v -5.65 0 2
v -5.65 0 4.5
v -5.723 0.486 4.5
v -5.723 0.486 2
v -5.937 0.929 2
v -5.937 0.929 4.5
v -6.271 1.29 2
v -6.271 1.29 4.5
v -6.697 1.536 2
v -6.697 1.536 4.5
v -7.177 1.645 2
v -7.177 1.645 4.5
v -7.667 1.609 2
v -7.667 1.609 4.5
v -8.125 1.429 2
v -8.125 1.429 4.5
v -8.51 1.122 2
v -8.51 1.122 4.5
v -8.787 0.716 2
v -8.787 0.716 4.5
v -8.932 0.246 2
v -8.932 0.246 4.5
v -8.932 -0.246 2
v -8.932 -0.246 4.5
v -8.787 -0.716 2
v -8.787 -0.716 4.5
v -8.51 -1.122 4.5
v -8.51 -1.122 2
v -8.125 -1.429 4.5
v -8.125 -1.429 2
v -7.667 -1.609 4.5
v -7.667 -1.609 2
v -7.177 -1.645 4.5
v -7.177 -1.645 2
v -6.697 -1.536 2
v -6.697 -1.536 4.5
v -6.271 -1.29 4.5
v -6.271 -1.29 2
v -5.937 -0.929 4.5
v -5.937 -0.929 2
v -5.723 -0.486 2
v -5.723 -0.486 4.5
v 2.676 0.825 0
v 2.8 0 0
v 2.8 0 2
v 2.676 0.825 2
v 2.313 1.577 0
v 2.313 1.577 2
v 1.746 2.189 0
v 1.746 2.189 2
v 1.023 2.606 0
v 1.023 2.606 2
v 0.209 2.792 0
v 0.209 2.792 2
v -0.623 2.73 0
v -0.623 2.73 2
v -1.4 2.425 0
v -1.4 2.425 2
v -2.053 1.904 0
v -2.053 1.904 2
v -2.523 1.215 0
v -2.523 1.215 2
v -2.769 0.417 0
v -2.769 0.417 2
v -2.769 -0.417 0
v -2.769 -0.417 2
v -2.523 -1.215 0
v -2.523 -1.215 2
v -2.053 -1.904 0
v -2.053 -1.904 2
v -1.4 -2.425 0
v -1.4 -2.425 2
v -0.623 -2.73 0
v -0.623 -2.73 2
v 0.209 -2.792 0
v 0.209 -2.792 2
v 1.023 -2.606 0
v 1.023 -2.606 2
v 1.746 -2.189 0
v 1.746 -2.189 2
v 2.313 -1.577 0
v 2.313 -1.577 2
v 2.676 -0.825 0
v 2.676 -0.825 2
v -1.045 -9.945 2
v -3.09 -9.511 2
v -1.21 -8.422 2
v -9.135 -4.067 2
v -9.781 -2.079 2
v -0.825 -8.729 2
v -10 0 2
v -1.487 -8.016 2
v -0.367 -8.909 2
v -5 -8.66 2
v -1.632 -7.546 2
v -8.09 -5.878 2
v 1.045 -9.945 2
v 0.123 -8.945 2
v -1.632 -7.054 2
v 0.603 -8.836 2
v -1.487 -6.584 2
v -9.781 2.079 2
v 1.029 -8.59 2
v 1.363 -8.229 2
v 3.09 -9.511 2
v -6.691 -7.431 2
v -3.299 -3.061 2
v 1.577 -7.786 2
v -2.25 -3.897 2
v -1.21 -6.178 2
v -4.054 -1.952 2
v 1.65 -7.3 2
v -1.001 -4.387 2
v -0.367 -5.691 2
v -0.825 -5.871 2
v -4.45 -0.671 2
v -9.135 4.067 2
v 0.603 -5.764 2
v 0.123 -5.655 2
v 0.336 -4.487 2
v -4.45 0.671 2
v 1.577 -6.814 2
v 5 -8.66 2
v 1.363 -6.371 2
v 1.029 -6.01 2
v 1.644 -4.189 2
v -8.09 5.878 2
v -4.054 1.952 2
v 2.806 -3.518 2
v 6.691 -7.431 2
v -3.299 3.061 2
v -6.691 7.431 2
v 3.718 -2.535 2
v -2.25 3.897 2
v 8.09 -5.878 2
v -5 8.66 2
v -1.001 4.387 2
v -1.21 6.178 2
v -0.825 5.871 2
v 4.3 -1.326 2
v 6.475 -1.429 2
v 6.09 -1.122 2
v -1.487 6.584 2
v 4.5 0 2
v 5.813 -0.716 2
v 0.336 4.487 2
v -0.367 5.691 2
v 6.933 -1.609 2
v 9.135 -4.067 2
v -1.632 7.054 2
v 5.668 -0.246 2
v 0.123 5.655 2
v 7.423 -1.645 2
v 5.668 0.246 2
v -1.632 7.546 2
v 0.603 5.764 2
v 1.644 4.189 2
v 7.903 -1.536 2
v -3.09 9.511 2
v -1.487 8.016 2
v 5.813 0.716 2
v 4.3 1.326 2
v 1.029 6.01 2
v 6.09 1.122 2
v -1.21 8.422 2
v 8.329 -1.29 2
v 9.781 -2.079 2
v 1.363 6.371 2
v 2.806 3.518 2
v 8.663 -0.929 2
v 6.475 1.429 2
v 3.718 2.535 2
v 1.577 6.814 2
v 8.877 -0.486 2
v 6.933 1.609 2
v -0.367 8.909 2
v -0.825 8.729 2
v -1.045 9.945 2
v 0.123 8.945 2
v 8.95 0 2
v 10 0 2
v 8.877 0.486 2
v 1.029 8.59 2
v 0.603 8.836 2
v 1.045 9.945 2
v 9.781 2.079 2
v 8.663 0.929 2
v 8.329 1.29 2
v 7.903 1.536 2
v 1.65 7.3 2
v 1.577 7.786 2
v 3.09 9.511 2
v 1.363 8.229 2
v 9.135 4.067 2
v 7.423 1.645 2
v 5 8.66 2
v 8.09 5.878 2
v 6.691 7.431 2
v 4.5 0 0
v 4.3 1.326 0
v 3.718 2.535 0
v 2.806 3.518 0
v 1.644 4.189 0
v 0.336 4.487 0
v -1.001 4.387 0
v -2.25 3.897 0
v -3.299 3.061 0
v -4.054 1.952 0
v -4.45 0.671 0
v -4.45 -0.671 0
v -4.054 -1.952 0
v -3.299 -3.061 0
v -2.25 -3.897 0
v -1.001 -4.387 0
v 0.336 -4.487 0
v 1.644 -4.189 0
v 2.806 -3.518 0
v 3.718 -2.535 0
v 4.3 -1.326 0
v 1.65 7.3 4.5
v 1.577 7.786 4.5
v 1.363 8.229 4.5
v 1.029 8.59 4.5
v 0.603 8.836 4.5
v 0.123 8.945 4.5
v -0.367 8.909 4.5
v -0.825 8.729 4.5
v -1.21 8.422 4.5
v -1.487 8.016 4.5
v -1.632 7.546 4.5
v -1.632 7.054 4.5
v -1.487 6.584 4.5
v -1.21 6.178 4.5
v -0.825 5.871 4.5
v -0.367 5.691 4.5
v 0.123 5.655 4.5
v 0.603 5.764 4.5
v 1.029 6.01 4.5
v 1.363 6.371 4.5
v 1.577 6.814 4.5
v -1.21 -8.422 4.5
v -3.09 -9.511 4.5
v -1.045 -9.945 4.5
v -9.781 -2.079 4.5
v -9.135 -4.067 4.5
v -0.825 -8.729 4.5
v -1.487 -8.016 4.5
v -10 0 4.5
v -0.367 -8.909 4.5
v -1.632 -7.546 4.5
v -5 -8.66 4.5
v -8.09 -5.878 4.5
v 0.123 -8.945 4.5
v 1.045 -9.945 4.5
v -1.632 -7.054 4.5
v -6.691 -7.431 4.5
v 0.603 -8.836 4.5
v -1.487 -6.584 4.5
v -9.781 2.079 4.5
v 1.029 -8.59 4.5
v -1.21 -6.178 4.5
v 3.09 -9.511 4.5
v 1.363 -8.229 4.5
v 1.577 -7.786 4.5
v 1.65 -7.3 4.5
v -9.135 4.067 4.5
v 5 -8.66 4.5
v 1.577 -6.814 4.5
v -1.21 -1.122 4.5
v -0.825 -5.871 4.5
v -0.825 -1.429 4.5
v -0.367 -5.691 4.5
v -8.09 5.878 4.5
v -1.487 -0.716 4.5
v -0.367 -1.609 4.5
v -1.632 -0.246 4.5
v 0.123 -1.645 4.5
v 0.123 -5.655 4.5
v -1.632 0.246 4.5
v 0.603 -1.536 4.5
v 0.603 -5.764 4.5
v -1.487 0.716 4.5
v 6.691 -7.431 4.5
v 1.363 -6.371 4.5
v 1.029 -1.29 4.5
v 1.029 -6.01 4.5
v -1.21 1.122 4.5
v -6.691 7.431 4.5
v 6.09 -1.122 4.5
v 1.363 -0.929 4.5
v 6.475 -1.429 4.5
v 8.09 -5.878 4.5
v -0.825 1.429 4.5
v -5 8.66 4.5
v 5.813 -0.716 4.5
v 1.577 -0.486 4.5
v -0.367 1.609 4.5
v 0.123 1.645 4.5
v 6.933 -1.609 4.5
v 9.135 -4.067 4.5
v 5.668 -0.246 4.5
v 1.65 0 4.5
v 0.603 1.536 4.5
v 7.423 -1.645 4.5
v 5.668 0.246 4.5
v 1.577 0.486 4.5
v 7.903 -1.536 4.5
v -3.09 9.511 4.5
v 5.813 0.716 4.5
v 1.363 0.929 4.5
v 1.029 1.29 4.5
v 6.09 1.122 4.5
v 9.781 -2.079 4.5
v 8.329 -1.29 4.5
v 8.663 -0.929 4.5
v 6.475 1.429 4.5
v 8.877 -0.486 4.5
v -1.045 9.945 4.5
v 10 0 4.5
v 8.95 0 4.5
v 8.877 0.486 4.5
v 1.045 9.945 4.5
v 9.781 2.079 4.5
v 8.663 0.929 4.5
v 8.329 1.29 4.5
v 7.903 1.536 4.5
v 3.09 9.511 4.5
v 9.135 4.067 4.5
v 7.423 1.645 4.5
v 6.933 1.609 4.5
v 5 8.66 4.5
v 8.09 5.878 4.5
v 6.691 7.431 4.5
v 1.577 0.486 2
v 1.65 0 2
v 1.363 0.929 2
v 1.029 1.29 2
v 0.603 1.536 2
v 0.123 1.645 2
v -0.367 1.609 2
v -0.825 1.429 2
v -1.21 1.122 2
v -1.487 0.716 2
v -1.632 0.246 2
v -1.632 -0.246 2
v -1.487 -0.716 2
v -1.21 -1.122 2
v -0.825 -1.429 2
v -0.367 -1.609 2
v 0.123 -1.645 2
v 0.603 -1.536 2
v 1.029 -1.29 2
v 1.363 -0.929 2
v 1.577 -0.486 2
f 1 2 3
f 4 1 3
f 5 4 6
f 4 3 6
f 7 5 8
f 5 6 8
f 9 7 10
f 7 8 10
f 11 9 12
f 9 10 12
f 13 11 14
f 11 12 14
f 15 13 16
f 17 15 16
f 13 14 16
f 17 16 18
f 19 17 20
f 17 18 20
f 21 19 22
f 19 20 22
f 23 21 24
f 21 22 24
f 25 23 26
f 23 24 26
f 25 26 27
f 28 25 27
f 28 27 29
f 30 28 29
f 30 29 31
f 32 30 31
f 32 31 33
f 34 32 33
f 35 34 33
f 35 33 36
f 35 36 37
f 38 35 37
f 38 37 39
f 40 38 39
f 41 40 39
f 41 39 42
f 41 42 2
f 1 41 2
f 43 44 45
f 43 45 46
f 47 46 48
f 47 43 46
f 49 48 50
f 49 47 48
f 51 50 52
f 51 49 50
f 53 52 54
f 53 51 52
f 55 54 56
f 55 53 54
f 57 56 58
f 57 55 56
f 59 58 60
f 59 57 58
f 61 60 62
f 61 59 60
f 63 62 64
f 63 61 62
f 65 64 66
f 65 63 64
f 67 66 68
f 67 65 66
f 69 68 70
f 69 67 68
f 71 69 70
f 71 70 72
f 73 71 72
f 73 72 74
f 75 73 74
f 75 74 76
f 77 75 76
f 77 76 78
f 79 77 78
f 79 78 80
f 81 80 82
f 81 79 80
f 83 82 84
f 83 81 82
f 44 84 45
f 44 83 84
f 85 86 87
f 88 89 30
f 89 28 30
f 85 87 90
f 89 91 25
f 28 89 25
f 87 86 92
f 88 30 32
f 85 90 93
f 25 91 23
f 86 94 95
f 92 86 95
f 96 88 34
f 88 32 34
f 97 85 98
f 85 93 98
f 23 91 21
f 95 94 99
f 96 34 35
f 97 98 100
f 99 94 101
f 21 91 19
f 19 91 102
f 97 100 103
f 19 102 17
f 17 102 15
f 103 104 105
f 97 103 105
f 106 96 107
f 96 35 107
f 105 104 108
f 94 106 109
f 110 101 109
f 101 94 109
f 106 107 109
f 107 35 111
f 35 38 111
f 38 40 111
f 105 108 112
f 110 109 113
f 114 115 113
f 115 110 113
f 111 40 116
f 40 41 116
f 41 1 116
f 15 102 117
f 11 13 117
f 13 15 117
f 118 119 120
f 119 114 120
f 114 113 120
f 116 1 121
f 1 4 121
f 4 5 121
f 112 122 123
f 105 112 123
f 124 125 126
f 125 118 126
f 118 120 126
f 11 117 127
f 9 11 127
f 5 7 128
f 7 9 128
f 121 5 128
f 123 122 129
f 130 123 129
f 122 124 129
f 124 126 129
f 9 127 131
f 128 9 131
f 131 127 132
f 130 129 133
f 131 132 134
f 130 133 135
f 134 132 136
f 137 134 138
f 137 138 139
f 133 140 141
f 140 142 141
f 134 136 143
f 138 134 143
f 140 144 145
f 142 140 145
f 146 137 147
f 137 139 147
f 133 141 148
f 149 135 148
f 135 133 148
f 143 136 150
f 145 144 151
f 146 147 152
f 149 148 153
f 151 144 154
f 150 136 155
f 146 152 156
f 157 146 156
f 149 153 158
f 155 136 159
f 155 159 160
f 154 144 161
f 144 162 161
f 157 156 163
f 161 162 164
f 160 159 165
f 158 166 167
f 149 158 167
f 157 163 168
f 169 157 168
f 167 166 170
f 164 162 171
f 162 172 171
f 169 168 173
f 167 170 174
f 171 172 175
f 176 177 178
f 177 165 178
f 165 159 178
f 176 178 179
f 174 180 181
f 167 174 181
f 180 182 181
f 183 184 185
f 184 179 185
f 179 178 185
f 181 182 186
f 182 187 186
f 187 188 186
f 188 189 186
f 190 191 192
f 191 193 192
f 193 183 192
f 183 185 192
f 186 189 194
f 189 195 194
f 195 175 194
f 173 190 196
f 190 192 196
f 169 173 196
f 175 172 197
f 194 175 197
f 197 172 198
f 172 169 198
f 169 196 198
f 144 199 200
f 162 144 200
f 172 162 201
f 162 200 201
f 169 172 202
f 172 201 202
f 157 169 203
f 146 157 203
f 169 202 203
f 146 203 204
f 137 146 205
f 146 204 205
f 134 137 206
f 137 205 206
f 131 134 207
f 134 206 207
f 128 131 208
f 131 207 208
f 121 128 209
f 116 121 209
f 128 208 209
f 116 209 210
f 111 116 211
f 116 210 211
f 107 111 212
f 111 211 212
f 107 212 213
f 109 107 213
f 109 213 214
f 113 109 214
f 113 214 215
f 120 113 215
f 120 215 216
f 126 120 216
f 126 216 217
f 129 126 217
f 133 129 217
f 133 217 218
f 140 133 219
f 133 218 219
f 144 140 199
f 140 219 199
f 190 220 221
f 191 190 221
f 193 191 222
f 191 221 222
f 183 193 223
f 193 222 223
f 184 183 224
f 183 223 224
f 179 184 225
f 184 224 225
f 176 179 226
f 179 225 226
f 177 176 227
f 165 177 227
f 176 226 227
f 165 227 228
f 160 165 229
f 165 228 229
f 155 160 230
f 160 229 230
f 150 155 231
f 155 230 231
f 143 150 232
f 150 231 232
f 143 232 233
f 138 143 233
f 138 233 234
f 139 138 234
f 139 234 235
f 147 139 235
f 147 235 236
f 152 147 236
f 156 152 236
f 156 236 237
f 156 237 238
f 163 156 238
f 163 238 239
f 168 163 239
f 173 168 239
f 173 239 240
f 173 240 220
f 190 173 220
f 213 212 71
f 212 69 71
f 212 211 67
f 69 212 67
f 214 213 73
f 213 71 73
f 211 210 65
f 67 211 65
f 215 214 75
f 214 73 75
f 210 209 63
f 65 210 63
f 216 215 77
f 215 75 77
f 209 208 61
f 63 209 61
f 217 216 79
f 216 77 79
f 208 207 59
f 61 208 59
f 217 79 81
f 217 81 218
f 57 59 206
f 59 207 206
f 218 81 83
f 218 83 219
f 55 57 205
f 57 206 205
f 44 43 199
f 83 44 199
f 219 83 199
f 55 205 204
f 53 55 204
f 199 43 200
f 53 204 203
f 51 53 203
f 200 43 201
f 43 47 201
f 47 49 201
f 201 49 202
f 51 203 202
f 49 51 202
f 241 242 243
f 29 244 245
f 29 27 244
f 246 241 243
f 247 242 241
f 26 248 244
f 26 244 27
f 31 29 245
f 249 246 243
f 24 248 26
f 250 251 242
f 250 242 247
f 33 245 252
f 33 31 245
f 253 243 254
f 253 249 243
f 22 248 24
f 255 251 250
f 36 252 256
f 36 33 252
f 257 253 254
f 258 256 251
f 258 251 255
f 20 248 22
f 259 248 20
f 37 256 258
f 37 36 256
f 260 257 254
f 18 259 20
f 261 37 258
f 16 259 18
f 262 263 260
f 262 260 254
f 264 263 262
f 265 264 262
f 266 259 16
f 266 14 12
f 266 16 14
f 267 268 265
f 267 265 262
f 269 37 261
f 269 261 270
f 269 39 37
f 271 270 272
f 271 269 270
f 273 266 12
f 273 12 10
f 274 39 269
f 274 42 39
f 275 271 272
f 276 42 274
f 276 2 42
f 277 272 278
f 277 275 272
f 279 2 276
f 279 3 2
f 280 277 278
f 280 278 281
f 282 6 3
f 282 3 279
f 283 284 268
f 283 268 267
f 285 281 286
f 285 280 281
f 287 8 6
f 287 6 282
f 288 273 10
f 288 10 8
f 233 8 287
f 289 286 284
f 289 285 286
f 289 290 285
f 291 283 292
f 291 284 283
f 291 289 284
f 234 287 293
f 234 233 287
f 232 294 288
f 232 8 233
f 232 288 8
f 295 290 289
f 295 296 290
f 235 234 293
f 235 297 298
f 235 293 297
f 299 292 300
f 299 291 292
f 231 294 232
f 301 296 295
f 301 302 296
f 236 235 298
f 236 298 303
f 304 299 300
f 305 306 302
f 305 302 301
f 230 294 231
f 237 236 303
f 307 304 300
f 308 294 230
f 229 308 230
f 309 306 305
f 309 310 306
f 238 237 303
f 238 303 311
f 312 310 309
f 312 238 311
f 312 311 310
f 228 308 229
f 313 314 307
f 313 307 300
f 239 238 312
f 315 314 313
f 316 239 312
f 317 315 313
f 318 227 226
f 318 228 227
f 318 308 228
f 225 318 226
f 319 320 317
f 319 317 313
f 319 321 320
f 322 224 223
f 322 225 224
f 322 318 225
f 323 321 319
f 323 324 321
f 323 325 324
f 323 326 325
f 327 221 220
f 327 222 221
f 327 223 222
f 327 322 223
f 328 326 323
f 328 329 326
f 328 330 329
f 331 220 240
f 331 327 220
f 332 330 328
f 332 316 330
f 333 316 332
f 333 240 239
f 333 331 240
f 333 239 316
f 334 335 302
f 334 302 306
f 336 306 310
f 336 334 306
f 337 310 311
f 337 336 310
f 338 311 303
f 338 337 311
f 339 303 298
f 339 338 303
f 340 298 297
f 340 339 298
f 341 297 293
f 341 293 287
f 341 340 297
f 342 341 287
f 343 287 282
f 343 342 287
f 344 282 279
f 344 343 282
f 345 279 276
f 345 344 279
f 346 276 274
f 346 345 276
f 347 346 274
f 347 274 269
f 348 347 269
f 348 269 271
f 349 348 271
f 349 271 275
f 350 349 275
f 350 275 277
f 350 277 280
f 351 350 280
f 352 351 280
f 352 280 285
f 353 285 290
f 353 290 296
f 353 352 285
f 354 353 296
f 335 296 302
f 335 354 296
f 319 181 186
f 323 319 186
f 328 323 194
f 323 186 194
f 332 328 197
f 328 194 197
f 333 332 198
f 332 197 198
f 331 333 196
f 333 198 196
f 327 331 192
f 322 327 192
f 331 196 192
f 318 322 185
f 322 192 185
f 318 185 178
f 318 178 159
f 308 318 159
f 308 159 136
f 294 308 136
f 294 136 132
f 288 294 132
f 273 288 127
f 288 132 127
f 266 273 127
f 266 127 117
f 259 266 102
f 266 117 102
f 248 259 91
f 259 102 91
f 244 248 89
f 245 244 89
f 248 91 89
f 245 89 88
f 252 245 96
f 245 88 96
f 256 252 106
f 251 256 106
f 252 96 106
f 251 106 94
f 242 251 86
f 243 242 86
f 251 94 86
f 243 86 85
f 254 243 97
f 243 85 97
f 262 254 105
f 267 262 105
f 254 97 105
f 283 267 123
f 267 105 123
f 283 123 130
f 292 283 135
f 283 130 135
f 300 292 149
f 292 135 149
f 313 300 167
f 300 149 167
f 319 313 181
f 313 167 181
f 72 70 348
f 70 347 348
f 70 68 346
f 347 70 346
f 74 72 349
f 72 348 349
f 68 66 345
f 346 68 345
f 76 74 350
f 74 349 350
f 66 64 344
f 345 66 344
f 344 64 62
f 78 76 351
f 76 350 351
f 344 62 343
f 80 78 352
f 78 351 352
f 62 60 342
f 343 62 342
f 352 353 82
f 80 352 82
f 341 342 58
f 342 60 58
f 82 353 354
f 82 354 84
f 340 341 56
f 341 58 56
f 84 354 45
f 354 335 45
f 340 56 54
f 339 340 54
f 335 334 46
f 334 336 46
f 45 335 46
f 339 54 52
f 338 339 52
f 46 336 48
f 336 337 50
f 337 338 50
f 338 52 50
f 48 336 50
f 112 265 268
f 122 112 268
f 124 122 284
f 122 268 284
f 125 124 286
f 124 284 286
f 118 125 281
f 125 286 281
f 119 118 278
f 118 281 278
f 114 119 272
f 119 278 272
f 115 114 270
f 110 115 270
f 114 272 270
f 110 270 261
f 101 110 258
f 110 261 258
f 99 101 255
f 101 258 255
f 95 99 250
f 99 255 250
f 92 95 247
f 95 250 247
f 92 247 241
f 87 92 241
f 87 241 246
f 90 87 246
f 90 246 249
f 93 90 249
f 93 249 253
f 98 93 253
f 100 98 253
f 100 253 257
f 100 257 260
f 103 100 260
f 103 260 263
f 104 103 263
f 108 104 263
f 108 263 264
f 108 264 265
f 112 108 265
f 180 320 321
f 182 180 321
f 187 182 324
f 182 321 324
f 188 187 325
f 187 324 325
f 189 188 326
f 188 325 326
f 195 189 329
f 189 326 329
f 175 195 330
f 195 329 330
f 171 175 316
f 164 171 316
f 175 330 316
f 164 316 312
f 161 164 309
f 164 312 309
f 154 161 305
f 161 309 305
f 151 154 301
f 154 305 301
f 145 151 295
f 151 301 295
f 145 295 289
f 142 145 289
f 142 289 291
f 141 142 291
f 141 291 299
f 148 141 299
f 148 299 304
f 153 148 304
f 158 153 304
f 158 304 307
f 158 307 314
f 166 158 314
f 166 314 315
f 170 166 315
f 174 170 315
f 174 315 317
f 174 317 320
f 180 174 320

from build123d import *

# Parameters (mm, degrees)
SKETCH_R      = 4.5
SKETCH_R_2    = 2.8
PAD_DEPTH     = 2
SKETCH001_R   = 10
SKETCH001_R_2 = 1.65
PAD001_DEPTH  = 2.5
SKETCH002_R   = 1.65
POCKET_DEPTH  = 4.501


with BuildPart() as part:
    # Sketch → Pad (new body)
    with BuildSketch(Plane.XY):
        Circle(SKETCH_R)
        Circle(SKETCH_R_2, mode=Mode.SUBTRACT)
    extrude(amount=PAD_DEPTH)

    # Sketch001 (on Face4 of Pad) → Pad001 (join)
    with BuildSketch(Plane.XY.offset(2)):
        Circle(SKETCH001_R)
        Circle(SKETCH001_R_2, mode=Mode.SUBTRACT)
    extrude(amount=PAD001_DEPTH)

    # Sketch002 (on Face7 of Pad001) → Pocket (cut, through all)
    with BuildSketch(Plane.XY.offset(4.5)):
        with Locations((-7.3, 0)):
            Circle(SKETCH002_R)
        with Locations((0, -7.3)):
            Circle(SKETCH002_R)
        with Locations((0, 7.3)):
            Circle(SKETCH002_R)
        with Locations((7.3, 0)):
            Circle(SKETCH002_R)
    extrude(amount=-POCKET_DEPTH, mode=Mode.SUBTRACT)


solid = part.part
